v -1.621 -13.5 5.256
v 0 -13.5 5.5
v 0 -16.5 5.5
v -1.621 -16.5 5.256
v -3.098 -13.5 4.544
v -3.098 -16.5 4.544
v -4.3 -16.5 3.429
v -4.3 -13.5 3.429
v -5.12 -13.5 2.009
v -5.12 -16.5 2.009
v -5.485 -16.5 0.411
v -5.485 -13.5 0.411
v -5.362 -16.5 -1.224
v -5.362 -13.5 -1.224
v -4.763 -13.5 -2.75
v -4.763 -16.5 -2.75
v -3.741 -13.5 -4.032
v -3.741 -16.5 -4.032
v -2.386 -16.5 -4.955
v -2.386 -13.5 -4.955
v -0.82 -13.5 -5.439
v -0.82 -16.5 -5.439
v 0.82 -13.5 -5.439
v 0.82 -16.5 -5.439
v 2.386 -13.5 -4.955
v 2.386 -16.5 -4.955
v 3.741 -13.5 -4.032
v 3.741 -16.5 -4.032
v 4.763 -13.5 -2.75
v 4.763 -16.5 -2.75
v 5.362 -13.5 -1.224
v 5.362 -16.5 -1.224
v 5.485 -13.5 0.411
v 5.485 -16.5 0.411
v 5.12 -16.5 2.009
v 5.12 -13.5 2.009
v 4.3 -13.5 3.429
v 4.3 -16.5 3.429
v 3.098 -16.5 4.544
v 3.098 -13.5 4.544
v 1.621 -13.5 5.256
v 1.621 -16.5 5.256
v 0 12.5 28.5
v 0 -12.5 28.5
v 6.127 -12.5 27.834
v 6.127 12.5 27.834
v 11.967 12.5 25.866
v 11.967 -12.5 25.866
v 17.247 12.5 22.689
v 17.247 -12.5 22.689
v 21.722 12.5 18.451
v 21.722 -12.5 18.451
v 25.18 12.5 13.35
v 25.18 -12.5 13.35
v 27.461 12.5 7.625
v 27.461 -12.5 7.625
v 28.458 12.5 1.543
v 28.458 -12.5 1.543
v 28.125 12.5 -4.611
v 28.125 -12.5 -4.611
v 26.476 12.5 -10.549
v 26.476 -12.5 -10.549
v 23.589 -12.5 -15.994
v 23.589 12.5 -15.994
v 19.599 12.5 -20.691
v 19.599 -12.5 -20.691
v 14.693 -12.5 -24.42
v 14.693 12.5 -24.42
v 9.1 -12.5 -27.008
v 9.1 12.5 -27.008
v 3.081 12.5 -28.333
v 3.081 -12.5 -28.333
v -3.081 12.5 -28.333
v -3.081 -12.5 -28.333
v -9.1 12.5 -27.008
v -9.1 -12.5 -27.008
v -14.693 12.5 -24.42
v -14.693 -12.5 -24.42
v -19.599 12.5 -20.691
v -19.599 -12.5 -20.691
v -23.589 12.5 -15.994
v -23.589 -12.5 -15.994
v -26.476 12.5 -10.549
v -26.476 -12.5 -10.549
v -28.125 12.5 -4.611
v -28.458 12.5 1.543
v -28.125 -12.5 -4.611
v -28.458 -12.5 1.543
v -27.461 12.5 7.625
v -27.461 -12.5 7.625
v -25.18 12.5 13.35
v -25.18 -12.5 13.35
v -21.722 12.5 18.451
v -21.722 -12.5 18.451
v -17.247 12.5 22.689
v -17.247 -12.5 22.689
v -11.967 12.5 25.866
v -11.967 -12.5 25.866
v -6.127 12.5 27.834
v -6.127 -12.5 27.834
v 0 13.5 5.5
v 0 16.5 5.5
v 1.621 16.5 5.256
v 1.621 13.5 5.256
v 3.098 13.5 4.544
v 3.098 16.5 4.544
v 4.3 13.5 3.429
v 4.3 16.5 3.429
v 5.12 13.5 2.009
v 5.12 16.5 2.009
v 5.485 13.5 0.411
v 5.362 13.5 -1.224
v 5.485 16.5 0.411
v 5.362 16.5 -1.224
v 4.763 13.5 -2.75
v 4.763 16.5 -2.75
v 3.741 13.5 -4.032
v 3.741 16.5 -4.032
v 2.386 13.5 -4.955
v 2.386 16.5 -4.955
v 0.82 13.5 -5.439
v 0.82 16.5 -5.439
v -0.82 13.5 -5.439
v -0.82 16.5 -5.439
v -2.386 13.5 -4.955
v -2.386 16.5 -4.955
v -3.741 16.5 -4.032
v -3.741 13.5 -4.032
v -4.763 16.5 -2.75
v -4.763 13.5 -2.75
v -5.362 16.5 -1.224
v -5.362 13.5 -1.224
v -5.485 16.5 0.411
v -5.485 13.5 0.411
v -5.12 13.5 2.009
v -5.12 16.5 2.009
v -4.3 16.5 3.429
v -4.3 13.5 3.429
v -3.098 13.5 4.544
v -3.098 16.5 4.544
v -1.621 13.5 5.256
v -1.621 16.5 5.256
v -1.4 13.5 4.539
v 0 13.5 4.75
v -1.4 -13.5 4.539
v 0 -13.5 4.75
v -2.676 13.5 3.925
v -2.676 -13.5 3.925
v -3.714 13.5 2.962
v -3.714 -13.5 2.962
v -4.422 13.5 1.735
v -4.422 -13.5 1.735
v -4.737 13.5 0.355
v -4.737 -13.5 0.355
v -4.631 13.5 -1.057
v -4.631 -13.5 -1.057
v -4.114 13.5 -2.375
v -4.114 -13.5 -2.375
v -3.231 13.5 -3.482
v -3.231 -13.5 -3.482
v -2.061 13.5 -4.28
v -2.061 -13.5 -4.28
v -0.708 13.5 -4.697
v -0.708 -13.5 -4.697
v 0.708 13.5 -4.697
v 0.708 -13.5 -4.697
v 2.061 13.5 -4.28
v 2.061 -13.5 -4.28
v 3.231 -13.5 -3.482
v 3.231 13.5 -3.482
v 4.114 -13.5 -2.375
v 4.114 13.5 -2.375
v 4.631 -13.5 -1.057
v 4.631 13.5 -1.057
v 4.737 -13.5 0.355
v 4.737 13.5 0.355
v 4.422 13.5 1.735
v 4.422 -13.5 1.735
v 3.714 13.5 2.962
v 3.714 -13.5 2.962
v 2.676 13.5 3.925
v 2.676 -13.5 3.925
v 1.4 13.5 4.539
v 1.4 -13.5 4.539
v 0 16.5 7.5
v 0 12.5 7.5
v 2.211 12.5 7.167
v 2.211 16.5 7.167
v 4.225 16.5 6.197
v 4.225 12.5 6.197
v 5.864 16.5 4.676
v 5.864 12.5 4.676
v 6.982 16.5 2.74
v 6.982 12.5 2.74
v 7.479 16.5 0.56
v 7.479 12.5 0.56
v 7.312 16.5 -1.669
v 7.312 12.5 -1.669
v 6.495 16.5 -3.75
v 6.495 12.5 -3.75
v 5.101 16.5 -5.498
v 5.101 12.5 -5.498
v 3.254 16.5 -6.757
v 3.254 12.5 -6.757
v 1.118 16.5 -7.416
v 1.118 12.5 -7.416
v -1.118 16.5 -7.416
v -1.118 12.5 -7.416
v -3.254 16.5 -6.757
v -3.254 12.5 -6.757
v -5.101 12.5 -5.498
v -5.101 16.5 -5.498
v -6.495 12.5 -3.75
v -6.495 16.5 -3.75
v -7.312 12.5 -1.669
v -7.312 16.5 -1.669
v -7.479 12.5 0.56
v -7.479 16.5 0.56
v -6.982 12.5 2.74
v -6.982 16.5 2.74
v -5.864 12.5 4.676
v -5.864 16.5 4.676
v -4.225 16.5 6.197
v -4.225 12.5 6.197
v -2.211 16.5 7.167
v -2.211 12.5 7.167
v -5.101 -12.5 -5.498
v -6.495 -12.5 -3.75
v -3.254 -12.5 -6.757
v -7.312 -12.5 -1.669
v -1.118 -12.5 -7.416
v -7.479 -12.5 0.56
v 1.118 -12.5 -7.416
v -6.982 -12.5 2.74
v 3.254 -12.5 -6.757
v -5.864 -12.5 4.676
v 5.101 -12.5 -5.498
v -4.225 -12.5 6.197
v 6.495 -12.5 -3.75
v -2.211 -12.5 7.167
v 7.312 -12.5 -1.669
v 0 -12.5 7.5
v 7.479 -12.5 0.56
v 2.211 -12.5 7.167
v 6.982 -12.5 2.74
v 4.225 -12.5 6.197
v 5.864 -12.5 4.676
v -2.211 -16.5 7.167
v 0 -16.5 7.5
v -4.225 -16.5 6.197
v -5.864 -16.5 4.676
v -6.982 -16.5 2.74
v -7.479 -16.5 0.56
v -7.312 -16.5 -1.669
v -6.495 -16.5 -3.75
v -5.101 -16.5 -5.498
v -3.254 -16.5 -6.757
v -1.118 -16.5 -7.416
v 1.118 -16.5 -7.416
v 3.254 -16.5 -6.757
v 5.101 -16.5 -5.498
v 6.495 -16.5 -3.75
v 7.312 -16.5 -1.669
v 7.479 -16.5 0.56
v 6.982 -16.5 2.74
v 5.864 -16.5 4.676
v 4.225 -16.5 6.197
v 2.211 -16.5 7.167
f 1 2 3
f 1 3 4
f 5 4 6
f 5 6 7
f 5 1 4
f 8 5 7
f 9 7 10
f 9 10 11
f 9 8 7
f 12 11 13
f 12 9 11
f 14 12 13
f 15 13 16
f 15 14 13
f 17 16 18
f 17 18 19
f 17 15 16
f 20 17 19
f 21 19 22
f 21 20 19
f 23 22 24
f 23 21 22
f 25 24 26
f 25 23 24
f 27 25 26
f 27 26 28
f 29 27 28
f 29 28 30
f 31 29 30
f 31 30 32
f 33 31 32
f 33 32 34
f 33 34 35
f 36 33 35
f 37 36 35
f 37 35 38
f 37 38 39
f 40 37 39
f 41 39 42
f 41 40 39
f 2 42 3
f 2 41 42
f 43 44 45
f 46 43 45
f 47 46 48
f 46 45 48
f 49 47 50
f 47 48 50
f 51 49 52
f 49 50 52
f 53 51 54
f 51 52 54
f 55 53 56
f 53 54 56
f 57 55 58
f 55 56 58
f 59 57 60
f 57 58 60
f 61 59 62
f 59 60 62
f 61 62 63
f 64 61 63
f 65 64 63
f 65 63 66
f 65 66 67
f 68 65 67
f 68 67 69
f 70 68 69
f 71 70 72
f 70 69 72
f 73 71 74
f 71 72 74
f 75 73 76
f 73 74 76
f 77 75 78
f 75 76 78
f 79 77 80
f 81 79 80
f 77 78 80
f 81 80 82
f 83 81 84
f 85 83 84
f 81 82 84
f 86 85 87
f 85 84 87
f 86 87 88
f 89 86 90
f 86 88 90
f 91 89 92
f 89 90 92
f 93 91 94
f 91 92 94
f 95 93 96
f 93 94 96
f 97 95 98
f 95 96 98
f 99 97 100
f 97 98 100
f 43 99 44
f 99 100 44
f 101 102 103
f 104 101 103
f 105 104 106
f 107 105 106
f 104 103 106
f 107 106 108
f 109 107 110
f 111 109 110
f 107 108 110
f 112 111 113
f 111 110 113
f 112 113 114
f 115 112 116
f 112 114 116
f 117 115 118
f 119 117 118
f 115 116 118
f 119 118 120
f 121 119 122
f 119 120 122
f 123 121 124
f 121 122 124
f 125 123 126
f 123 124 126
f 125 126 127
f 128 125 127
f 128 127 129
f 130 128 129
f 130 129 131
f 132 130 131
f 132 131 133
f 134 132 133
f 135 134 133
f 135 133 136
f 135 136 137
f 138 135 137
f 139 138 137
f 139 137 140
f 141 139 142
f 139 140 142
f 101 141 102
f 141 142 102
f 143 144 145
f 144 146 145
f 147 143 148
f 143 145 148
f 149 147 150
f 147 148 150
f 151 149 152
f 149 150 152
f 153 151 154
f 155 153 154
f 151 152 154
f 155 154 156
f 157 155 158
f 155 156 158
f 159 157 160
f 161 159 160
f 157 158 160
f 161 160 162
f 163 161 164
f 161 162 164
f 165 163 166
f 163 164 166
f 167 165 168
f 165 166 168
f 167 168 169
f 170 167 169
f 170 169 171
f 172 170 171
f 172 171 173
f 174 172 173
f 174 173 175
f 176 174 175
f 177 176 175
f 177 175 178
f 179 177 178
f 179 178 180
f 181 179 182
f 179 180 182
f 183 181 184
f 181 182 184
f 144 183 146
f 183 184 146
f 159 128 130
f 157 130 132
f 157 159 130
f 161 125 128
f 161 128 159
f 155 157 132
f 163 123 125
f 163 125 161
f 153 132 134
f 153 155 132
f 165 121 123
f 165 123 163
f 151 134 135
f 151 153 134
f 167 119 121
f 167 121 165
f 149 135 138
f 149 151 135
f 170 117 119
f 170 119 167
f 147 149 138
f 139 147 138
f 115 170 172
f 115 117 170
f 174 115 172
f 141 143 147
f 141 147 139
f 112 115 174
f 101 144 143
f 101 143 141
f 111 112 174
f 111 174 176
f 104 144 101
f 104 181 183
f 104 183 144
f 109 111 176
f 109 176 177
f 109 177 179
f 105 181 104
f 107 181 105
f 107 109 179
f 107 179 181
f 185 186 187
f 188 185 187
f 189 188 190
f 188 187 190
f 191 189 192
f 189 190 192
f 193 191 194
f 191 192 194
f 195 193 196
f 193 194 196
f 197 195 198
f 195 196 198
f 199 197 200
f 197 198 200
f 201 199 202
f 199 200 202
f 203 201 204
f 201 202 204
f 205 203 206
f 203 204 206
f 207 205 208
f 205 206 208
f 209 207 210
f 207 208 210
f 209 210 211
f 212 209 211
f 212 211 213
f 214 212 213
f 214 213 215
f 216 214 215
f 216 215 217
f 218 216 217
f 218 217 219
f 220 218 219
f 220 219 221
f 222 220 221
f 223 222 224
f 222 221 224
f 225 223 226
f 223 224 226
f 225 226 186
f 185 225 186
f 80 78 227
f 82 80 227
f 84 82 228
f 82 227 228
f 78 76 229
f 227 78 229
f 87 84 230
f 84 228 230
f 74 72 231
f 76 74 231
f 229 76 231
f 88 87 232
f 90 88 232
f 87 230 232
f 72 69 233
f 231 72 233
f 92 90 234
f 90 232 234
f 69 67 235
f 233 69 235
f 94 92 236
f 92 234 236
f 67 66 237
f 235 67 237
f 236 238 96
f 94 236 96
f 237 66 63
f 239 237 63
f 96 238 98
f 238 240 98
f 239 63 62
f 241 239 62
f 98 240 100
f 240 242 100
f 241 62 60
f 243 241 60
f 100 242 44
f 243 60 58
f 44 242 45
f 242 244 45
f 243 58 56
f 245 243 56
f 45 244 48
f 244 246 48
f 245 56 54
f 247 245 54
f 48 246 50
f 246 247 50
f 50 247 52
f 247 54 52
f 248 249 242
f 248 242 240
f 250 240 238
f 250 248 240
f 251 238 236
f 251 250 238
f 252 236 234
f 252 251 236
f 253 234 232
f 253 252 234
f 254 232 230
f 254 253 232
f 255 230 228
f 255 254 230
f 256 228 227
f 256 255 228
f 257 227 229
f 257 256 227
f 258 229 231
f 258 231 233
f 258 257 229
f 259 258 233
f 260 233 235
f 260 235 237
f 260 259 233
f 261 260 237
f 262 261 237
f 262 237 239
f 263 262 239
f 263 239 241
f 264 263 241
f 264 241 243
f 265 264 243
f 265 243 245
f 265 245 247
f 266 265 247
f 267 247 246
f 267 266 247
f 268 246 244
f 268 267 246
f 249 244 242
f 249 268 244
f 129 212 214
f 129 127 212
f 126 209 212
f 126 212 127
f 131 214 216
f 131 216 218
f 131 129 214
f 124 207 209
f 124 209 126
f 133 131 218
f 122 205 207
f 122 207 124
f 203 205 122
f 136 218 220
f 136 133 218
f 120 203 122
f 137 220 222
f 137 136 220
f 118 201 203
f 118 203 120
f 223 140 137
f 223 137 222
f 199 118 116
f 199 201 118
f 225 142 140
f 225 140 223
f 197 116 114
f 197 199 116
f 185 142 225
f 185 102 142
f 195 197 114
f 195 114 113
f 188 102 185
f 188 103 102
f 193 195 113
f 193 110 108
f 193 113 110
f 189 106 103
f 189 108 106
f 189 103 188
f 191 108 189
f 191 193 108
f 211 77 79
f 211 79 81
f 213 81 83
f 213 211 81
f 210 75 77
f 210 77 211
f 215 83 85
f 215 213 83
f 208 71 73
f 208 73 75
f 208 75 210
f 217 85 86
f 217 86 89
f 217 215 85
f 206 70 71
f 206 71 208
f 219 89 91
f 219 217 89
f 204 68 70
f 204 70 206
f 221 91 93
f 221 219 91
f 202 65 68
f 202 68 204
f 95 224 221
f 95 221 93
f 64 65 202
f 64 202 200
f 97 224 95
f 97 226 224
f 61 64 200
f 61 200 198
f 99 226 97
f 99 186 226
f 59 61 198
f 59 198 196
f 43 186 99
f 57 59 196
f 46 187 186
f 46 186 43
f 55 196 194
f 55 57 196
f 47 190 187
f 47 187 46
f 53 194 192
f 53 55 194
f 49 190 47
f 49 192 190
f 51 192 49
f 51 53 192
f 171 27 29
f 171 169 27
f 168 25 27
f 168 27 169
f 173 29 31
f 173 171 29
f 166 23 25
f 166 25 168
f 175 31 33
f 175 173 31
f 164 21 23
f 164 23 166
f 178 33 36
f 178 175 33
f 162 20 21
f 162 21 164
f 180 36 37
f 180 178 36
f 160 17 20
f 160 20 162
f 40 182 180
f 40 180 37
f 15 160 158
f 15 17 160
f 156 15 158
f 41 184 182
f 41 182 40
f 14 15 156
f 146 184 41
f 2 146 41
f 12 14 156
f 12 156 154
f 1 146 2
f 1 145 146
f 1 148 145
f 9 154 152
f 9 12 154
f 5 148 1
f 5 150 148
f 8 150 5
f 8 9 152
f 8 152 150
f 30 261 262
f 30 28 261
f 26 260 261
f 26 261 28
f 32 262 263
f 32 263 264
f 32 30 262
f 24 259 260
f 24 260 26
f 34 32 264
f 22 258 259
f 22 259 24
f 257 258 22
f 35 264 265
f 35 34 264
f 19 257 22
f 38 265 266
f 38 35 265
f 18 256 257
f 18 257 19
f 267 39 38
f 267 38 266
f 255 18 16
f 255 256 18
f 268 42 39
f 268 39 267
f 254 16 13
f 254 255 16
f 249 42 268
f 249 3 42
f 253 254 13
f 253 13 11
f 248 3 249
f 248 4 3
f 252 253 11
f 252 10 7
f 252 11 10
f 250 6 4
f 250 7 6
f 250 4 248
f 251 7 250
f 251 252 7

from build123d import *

# Parameters (mm, degrees)
EXTRUDE_1_DEPTH      = 12.5
EXTRUDE_1_DEPTH_BACK = 12.5
SKETCH_1_R           = 28.5
SKETCH_1_R_2         = 4.75
SKETCH_2_R           = 7.5
SKETCH_2_R_2         = 4.75
EXTRUDE_2_DEPTH      = 4
EXTRUDE_START        = 4
SKETCH_3_R           = 7.5
SKETCH_3_R_2         = 4.75
EXTRUDE_3_DEPTH      = 4
SKETCH_4_R           = 5.5
CUT_EXTRUDE_1_DEPTH  = 3
CUT_EXTRUDE_START    = -3
SKETCH_5_R           = 5.5
CUT_EXTRUDE_2_DEPTH  = 3


with BuildPart() as part:
    # 草图1 → 凸台-拉伸1 (new, two sides: drawn at the far end of the back side and taken through both)
    with BuildSketch(Plane(origin=(0, 0, 0), x_dir=(1, 0, 0), z_dir=(0, 1, 0)).offset(-EXTRUDE_1_DEPTH_BACK)):
        with Locations(Location((0, 0, 0), (0, 0, 270))):
            Circle(SKETCH_1_R)
        with Locations(Location((0, 0, 0), (0, 0, 270))):
            Circle(SKETCH_1_R_2, mode=Mode.SUBTRACT)
    extrude(amount=EXTRUDE_1_DEPTH + EXTRUDE_1_DEPTH_BACK)

    # 草图2 → 凸台-拉伸2 (add)
    with BuildSketch(Plane(origin=(0, 12.5, 0), x_dir=(1, 0, 0), z_dir=(0, 1, 0))):
        with Locations(Location((0, 0, 0), (0, 0, 270))):
            Circle(SKETCH_2_R)
        with Locations(Location((0, 0, 0), (0, 0, 270))):
            Circle(SKETCH_2_R_2, mode=Mode.SUBTRACT)
    extrude(amount=EXTRUDE_2_DEPTH)

    # 草图3 → 凸台-拉伸3 (add)
    with BuildSketch(Plane(origin=(0, -12.5, 0), x_dir=(-1, 0, 0), z_dir=(0, -1, 0)).offset(EXTRUDE_START)):
        with Locations(Location((0, 0, 0), (0, 0, 270))):
            Circle(SKETCH_3_R)
        with Locations(Location((0, 0, 0), (0, 0, 270))):
            Circle(SKETCH_3_R_2, mode=Mode.SUBTRACT)
    extrude(amount=-EXTRUDE_3_DEPTH)

    # 草图4 → 切除-拉伸1 (cut)
    with BuildSketch(Plane(origin=(0, 16.5, 0), x_dir=(1, 0, 0), z_dir=(0, 1, 0))):
        with Locations(Location((0, 0, 0), (0, 0, 270))):
            Circle(SKETCH_4_R)
    extrude(amount=-CUT_EXTRUDE_1_DEPTH, mode=Mode.SUBTRACT)

    # 草图5 → 切除-拉伸2 (cut)
    with BuildSketch(Plane(origin=(0, -16.5, 0), x_dir=(-1, 0, 0), z_dir=(0, -1, 0)).offset(CUT_EXTRUDE_START)):
        with Locations(Location((0, 0, 0), (0, 0, 270))):
            Circle(SKETCH_5_R)
    extrude(amount=CUT_EXTRUDE_2_DEPTH, mode=Mode.SUBTRACT)


solid = part.part
